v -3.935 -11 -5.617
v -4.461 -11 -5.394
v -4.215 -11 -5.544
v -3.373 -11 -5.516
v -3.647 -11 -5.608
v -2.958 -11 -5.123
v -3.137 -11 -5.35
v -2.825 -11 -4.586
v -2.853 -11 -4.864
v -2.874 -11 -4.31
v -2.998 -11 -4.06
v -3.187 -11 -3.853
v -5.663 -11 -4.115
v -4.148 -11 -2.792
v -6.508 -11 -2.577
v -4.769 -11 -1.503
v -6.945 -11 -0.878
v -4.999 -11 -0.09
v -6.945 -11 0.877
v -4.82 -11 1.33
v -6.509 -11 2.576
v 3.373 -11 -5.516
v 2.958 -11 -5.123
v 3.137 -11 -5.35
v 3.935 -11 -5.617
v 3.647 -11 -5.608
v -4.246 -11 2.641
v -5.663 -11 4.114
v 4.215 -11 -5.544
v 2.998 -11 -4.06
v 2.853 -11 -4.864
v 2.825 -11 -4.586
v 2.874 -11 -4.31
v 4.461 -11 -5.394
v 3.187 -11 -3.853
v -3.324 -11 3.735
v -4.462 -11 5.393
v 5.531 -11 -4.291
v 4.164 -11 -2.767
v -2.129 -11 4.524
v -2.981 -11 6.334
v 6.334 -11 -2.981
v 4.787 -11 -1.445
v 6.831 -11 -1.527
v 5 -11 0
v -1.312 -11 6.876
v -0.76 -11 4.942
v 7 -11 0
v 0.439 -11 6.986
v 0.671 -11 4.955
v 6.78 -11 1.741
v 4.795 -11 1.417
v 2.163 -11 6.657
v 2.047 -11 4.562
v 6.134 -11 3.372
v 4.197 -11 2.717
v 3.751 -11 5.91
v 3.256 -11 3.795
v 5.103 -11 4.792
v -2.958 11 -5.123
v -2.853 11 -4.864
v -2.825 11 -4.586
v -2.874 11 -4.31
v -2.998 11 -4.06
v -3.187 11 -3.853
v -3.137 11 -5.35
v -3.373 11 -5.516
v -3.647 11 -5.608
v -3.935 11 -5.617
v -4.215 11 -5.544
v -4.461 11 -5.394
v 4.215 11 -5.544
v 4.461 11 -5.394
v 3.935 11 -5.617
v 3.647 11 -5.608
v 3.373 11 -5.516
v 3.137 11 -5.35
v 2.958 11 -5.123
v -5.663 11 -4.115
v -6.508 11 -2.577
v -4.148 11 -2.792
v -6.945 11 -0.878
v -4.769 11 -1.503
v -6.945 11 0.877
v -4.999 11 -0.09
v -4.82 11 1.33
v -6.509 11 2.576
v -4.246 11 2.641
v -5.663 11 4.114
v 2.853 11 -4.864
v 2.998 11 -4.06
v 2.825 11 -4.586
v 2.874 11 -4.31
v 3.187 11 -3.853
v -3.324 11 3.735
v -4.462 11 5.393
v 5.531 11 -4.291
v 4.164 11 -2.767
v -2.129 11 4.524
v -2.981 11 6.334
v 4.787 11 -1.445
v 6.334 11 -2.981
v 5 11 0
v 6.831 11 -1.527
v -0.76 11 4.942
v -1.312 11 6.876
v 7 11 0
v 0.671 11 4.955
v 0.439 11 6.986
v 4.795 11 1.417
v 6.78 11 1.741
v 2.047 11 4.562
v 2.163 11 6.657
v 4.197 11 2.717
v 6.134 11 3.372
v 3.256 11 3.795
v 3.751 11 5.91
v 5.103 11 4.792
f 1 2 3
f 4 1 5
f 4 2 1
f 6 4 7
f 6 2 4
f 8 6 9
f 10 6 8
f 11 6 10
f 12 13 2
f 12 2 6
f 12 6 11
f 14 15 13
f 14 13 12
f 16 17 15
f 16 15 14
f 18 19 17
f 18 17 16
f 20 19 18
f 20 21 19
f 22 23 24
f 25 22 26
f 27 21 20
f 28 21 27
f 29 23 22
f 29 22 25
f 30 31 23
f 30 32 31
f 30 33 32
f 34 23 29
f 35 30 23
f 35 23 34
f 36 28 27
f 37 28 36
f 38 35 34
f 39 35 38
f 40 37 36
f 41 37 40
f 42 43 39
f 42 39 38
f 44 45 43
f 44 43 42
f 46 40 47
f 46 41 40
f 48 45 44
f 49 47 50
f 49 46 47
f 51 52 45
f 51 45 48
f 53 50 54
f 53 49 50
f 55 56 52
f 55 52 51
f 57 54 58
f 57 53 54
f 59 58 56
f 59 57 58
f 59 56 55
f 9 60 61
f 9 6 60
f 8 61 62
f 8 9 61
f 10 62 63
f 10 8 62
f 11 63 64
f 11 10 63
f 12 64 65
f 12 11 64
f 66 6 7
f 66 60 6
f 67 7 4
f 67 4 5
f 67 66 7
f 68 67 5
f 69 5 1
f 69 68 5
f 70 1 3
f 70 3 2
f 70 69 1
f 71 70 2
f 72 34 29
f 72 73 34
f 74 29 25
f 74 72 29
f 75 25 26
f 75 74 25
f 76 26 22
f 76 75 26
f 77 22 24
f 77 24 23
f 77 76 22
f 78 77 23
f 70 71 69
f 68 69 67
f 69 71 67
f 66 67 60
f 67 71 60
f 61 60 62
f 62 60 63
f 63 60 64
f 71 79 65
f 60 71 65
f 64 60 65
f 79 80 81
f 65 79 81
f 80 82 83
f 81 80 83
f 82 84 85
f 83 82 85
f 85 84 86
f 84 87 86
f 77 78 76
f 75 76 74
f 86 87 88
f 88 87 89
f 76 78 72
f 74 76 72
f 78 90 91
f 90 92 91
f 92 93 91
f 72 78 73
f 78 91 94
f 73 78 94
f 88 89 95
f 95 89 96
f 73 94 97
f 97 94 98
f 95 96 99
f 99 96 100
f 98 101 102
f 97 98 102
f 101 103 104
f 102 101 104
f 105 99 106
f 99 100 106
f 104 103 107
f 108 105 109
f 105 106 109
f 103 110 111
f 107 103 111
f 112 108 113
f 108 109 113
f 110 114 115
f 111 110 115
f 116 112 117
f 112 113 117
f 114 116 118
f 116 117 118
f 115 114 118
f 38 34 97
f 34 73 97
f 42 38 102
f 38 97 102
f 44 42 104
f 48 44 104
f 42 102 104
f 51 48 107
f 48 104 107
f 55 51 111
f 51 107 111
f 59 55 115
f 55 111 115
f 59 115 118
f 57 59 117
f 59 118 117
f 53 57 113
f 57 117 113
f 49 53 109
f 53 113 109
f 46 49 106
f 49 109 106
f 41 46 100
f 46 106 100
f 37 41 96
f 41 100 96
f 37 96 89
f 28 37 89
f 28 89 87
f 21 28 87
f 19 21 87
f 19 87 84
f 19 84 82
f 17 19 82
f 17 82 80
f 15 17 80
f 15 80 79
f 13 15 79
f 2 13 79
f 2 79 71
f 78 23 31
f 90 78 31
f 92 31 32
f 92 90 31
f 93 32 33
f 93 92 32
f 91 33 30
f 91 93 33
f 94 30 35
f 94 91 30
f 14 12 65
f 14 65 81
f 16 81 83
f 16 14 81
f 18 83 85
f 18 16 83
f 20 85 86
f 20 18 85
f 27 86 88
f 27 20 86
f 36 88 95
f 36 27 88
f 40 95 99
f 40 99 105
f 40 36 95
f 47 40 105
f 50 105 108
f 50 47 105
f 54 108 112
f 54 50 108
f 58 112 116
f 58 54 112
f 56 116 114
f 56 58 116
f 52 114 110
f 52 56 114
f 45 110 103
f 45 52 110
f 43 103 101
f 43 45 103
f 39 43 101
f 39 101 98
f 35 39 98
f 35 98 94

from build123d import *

# Parameters (mm, degrees)
F1_DEPTH = 11
F2_R     = 0.99999


# Not quite as in the source:
# - a fillet or chamfer is up to 0.001 mm smaller than in the source, because OpenCascade refuses the exact size


with BuildPart() as f1:
    # F0 (on Front) → F1 (new body, symmetric)
    with BuildSketch(Plane.XZ):
        with BuildLine():
            Line((-3.5, -6.0621778265), (-2.5, -4.3301270189))
            ThreePointArc((-2.5, -4.3301270189), (-2.5, 4.3301270189), (5, 0))
            ThreePointArc((5, 0), (4.3301270189, -2.5), (2.5, -4.3301270189))
            Line((2.5, -4.3301270189), (3.5, -6.0621778265))
            ThreePointArc((3.5, -6.0621778265), (6.0621778265, -3.5), (7, 0))
            ThreePointArc((7, 0), (-3.5, 6.0621778265), (-3.5, -6.0621778265))
        make_face()
    extrude(amount=F1_DEPTH, both=True)

    # F2 (radius 1 in the source; OpenCascade refuses exactly that, so slightly less here)
    f2_edges = [f1.edges().sort_by_distance(p)[0] for p in [
        (3.5, 5.5, -6.062178),
        (3.5, -5.5, -6.062178),
        (2.5, -5.5, -4.330127),
        (-2.5, -5.5, -4.330127),
        (-3.5, 5.5, -6.062178),
        (-3.5, -5.5, -6.062178),
    ]]
    fillet(f2_edges, radius=F2_R)


solid = f1.part
